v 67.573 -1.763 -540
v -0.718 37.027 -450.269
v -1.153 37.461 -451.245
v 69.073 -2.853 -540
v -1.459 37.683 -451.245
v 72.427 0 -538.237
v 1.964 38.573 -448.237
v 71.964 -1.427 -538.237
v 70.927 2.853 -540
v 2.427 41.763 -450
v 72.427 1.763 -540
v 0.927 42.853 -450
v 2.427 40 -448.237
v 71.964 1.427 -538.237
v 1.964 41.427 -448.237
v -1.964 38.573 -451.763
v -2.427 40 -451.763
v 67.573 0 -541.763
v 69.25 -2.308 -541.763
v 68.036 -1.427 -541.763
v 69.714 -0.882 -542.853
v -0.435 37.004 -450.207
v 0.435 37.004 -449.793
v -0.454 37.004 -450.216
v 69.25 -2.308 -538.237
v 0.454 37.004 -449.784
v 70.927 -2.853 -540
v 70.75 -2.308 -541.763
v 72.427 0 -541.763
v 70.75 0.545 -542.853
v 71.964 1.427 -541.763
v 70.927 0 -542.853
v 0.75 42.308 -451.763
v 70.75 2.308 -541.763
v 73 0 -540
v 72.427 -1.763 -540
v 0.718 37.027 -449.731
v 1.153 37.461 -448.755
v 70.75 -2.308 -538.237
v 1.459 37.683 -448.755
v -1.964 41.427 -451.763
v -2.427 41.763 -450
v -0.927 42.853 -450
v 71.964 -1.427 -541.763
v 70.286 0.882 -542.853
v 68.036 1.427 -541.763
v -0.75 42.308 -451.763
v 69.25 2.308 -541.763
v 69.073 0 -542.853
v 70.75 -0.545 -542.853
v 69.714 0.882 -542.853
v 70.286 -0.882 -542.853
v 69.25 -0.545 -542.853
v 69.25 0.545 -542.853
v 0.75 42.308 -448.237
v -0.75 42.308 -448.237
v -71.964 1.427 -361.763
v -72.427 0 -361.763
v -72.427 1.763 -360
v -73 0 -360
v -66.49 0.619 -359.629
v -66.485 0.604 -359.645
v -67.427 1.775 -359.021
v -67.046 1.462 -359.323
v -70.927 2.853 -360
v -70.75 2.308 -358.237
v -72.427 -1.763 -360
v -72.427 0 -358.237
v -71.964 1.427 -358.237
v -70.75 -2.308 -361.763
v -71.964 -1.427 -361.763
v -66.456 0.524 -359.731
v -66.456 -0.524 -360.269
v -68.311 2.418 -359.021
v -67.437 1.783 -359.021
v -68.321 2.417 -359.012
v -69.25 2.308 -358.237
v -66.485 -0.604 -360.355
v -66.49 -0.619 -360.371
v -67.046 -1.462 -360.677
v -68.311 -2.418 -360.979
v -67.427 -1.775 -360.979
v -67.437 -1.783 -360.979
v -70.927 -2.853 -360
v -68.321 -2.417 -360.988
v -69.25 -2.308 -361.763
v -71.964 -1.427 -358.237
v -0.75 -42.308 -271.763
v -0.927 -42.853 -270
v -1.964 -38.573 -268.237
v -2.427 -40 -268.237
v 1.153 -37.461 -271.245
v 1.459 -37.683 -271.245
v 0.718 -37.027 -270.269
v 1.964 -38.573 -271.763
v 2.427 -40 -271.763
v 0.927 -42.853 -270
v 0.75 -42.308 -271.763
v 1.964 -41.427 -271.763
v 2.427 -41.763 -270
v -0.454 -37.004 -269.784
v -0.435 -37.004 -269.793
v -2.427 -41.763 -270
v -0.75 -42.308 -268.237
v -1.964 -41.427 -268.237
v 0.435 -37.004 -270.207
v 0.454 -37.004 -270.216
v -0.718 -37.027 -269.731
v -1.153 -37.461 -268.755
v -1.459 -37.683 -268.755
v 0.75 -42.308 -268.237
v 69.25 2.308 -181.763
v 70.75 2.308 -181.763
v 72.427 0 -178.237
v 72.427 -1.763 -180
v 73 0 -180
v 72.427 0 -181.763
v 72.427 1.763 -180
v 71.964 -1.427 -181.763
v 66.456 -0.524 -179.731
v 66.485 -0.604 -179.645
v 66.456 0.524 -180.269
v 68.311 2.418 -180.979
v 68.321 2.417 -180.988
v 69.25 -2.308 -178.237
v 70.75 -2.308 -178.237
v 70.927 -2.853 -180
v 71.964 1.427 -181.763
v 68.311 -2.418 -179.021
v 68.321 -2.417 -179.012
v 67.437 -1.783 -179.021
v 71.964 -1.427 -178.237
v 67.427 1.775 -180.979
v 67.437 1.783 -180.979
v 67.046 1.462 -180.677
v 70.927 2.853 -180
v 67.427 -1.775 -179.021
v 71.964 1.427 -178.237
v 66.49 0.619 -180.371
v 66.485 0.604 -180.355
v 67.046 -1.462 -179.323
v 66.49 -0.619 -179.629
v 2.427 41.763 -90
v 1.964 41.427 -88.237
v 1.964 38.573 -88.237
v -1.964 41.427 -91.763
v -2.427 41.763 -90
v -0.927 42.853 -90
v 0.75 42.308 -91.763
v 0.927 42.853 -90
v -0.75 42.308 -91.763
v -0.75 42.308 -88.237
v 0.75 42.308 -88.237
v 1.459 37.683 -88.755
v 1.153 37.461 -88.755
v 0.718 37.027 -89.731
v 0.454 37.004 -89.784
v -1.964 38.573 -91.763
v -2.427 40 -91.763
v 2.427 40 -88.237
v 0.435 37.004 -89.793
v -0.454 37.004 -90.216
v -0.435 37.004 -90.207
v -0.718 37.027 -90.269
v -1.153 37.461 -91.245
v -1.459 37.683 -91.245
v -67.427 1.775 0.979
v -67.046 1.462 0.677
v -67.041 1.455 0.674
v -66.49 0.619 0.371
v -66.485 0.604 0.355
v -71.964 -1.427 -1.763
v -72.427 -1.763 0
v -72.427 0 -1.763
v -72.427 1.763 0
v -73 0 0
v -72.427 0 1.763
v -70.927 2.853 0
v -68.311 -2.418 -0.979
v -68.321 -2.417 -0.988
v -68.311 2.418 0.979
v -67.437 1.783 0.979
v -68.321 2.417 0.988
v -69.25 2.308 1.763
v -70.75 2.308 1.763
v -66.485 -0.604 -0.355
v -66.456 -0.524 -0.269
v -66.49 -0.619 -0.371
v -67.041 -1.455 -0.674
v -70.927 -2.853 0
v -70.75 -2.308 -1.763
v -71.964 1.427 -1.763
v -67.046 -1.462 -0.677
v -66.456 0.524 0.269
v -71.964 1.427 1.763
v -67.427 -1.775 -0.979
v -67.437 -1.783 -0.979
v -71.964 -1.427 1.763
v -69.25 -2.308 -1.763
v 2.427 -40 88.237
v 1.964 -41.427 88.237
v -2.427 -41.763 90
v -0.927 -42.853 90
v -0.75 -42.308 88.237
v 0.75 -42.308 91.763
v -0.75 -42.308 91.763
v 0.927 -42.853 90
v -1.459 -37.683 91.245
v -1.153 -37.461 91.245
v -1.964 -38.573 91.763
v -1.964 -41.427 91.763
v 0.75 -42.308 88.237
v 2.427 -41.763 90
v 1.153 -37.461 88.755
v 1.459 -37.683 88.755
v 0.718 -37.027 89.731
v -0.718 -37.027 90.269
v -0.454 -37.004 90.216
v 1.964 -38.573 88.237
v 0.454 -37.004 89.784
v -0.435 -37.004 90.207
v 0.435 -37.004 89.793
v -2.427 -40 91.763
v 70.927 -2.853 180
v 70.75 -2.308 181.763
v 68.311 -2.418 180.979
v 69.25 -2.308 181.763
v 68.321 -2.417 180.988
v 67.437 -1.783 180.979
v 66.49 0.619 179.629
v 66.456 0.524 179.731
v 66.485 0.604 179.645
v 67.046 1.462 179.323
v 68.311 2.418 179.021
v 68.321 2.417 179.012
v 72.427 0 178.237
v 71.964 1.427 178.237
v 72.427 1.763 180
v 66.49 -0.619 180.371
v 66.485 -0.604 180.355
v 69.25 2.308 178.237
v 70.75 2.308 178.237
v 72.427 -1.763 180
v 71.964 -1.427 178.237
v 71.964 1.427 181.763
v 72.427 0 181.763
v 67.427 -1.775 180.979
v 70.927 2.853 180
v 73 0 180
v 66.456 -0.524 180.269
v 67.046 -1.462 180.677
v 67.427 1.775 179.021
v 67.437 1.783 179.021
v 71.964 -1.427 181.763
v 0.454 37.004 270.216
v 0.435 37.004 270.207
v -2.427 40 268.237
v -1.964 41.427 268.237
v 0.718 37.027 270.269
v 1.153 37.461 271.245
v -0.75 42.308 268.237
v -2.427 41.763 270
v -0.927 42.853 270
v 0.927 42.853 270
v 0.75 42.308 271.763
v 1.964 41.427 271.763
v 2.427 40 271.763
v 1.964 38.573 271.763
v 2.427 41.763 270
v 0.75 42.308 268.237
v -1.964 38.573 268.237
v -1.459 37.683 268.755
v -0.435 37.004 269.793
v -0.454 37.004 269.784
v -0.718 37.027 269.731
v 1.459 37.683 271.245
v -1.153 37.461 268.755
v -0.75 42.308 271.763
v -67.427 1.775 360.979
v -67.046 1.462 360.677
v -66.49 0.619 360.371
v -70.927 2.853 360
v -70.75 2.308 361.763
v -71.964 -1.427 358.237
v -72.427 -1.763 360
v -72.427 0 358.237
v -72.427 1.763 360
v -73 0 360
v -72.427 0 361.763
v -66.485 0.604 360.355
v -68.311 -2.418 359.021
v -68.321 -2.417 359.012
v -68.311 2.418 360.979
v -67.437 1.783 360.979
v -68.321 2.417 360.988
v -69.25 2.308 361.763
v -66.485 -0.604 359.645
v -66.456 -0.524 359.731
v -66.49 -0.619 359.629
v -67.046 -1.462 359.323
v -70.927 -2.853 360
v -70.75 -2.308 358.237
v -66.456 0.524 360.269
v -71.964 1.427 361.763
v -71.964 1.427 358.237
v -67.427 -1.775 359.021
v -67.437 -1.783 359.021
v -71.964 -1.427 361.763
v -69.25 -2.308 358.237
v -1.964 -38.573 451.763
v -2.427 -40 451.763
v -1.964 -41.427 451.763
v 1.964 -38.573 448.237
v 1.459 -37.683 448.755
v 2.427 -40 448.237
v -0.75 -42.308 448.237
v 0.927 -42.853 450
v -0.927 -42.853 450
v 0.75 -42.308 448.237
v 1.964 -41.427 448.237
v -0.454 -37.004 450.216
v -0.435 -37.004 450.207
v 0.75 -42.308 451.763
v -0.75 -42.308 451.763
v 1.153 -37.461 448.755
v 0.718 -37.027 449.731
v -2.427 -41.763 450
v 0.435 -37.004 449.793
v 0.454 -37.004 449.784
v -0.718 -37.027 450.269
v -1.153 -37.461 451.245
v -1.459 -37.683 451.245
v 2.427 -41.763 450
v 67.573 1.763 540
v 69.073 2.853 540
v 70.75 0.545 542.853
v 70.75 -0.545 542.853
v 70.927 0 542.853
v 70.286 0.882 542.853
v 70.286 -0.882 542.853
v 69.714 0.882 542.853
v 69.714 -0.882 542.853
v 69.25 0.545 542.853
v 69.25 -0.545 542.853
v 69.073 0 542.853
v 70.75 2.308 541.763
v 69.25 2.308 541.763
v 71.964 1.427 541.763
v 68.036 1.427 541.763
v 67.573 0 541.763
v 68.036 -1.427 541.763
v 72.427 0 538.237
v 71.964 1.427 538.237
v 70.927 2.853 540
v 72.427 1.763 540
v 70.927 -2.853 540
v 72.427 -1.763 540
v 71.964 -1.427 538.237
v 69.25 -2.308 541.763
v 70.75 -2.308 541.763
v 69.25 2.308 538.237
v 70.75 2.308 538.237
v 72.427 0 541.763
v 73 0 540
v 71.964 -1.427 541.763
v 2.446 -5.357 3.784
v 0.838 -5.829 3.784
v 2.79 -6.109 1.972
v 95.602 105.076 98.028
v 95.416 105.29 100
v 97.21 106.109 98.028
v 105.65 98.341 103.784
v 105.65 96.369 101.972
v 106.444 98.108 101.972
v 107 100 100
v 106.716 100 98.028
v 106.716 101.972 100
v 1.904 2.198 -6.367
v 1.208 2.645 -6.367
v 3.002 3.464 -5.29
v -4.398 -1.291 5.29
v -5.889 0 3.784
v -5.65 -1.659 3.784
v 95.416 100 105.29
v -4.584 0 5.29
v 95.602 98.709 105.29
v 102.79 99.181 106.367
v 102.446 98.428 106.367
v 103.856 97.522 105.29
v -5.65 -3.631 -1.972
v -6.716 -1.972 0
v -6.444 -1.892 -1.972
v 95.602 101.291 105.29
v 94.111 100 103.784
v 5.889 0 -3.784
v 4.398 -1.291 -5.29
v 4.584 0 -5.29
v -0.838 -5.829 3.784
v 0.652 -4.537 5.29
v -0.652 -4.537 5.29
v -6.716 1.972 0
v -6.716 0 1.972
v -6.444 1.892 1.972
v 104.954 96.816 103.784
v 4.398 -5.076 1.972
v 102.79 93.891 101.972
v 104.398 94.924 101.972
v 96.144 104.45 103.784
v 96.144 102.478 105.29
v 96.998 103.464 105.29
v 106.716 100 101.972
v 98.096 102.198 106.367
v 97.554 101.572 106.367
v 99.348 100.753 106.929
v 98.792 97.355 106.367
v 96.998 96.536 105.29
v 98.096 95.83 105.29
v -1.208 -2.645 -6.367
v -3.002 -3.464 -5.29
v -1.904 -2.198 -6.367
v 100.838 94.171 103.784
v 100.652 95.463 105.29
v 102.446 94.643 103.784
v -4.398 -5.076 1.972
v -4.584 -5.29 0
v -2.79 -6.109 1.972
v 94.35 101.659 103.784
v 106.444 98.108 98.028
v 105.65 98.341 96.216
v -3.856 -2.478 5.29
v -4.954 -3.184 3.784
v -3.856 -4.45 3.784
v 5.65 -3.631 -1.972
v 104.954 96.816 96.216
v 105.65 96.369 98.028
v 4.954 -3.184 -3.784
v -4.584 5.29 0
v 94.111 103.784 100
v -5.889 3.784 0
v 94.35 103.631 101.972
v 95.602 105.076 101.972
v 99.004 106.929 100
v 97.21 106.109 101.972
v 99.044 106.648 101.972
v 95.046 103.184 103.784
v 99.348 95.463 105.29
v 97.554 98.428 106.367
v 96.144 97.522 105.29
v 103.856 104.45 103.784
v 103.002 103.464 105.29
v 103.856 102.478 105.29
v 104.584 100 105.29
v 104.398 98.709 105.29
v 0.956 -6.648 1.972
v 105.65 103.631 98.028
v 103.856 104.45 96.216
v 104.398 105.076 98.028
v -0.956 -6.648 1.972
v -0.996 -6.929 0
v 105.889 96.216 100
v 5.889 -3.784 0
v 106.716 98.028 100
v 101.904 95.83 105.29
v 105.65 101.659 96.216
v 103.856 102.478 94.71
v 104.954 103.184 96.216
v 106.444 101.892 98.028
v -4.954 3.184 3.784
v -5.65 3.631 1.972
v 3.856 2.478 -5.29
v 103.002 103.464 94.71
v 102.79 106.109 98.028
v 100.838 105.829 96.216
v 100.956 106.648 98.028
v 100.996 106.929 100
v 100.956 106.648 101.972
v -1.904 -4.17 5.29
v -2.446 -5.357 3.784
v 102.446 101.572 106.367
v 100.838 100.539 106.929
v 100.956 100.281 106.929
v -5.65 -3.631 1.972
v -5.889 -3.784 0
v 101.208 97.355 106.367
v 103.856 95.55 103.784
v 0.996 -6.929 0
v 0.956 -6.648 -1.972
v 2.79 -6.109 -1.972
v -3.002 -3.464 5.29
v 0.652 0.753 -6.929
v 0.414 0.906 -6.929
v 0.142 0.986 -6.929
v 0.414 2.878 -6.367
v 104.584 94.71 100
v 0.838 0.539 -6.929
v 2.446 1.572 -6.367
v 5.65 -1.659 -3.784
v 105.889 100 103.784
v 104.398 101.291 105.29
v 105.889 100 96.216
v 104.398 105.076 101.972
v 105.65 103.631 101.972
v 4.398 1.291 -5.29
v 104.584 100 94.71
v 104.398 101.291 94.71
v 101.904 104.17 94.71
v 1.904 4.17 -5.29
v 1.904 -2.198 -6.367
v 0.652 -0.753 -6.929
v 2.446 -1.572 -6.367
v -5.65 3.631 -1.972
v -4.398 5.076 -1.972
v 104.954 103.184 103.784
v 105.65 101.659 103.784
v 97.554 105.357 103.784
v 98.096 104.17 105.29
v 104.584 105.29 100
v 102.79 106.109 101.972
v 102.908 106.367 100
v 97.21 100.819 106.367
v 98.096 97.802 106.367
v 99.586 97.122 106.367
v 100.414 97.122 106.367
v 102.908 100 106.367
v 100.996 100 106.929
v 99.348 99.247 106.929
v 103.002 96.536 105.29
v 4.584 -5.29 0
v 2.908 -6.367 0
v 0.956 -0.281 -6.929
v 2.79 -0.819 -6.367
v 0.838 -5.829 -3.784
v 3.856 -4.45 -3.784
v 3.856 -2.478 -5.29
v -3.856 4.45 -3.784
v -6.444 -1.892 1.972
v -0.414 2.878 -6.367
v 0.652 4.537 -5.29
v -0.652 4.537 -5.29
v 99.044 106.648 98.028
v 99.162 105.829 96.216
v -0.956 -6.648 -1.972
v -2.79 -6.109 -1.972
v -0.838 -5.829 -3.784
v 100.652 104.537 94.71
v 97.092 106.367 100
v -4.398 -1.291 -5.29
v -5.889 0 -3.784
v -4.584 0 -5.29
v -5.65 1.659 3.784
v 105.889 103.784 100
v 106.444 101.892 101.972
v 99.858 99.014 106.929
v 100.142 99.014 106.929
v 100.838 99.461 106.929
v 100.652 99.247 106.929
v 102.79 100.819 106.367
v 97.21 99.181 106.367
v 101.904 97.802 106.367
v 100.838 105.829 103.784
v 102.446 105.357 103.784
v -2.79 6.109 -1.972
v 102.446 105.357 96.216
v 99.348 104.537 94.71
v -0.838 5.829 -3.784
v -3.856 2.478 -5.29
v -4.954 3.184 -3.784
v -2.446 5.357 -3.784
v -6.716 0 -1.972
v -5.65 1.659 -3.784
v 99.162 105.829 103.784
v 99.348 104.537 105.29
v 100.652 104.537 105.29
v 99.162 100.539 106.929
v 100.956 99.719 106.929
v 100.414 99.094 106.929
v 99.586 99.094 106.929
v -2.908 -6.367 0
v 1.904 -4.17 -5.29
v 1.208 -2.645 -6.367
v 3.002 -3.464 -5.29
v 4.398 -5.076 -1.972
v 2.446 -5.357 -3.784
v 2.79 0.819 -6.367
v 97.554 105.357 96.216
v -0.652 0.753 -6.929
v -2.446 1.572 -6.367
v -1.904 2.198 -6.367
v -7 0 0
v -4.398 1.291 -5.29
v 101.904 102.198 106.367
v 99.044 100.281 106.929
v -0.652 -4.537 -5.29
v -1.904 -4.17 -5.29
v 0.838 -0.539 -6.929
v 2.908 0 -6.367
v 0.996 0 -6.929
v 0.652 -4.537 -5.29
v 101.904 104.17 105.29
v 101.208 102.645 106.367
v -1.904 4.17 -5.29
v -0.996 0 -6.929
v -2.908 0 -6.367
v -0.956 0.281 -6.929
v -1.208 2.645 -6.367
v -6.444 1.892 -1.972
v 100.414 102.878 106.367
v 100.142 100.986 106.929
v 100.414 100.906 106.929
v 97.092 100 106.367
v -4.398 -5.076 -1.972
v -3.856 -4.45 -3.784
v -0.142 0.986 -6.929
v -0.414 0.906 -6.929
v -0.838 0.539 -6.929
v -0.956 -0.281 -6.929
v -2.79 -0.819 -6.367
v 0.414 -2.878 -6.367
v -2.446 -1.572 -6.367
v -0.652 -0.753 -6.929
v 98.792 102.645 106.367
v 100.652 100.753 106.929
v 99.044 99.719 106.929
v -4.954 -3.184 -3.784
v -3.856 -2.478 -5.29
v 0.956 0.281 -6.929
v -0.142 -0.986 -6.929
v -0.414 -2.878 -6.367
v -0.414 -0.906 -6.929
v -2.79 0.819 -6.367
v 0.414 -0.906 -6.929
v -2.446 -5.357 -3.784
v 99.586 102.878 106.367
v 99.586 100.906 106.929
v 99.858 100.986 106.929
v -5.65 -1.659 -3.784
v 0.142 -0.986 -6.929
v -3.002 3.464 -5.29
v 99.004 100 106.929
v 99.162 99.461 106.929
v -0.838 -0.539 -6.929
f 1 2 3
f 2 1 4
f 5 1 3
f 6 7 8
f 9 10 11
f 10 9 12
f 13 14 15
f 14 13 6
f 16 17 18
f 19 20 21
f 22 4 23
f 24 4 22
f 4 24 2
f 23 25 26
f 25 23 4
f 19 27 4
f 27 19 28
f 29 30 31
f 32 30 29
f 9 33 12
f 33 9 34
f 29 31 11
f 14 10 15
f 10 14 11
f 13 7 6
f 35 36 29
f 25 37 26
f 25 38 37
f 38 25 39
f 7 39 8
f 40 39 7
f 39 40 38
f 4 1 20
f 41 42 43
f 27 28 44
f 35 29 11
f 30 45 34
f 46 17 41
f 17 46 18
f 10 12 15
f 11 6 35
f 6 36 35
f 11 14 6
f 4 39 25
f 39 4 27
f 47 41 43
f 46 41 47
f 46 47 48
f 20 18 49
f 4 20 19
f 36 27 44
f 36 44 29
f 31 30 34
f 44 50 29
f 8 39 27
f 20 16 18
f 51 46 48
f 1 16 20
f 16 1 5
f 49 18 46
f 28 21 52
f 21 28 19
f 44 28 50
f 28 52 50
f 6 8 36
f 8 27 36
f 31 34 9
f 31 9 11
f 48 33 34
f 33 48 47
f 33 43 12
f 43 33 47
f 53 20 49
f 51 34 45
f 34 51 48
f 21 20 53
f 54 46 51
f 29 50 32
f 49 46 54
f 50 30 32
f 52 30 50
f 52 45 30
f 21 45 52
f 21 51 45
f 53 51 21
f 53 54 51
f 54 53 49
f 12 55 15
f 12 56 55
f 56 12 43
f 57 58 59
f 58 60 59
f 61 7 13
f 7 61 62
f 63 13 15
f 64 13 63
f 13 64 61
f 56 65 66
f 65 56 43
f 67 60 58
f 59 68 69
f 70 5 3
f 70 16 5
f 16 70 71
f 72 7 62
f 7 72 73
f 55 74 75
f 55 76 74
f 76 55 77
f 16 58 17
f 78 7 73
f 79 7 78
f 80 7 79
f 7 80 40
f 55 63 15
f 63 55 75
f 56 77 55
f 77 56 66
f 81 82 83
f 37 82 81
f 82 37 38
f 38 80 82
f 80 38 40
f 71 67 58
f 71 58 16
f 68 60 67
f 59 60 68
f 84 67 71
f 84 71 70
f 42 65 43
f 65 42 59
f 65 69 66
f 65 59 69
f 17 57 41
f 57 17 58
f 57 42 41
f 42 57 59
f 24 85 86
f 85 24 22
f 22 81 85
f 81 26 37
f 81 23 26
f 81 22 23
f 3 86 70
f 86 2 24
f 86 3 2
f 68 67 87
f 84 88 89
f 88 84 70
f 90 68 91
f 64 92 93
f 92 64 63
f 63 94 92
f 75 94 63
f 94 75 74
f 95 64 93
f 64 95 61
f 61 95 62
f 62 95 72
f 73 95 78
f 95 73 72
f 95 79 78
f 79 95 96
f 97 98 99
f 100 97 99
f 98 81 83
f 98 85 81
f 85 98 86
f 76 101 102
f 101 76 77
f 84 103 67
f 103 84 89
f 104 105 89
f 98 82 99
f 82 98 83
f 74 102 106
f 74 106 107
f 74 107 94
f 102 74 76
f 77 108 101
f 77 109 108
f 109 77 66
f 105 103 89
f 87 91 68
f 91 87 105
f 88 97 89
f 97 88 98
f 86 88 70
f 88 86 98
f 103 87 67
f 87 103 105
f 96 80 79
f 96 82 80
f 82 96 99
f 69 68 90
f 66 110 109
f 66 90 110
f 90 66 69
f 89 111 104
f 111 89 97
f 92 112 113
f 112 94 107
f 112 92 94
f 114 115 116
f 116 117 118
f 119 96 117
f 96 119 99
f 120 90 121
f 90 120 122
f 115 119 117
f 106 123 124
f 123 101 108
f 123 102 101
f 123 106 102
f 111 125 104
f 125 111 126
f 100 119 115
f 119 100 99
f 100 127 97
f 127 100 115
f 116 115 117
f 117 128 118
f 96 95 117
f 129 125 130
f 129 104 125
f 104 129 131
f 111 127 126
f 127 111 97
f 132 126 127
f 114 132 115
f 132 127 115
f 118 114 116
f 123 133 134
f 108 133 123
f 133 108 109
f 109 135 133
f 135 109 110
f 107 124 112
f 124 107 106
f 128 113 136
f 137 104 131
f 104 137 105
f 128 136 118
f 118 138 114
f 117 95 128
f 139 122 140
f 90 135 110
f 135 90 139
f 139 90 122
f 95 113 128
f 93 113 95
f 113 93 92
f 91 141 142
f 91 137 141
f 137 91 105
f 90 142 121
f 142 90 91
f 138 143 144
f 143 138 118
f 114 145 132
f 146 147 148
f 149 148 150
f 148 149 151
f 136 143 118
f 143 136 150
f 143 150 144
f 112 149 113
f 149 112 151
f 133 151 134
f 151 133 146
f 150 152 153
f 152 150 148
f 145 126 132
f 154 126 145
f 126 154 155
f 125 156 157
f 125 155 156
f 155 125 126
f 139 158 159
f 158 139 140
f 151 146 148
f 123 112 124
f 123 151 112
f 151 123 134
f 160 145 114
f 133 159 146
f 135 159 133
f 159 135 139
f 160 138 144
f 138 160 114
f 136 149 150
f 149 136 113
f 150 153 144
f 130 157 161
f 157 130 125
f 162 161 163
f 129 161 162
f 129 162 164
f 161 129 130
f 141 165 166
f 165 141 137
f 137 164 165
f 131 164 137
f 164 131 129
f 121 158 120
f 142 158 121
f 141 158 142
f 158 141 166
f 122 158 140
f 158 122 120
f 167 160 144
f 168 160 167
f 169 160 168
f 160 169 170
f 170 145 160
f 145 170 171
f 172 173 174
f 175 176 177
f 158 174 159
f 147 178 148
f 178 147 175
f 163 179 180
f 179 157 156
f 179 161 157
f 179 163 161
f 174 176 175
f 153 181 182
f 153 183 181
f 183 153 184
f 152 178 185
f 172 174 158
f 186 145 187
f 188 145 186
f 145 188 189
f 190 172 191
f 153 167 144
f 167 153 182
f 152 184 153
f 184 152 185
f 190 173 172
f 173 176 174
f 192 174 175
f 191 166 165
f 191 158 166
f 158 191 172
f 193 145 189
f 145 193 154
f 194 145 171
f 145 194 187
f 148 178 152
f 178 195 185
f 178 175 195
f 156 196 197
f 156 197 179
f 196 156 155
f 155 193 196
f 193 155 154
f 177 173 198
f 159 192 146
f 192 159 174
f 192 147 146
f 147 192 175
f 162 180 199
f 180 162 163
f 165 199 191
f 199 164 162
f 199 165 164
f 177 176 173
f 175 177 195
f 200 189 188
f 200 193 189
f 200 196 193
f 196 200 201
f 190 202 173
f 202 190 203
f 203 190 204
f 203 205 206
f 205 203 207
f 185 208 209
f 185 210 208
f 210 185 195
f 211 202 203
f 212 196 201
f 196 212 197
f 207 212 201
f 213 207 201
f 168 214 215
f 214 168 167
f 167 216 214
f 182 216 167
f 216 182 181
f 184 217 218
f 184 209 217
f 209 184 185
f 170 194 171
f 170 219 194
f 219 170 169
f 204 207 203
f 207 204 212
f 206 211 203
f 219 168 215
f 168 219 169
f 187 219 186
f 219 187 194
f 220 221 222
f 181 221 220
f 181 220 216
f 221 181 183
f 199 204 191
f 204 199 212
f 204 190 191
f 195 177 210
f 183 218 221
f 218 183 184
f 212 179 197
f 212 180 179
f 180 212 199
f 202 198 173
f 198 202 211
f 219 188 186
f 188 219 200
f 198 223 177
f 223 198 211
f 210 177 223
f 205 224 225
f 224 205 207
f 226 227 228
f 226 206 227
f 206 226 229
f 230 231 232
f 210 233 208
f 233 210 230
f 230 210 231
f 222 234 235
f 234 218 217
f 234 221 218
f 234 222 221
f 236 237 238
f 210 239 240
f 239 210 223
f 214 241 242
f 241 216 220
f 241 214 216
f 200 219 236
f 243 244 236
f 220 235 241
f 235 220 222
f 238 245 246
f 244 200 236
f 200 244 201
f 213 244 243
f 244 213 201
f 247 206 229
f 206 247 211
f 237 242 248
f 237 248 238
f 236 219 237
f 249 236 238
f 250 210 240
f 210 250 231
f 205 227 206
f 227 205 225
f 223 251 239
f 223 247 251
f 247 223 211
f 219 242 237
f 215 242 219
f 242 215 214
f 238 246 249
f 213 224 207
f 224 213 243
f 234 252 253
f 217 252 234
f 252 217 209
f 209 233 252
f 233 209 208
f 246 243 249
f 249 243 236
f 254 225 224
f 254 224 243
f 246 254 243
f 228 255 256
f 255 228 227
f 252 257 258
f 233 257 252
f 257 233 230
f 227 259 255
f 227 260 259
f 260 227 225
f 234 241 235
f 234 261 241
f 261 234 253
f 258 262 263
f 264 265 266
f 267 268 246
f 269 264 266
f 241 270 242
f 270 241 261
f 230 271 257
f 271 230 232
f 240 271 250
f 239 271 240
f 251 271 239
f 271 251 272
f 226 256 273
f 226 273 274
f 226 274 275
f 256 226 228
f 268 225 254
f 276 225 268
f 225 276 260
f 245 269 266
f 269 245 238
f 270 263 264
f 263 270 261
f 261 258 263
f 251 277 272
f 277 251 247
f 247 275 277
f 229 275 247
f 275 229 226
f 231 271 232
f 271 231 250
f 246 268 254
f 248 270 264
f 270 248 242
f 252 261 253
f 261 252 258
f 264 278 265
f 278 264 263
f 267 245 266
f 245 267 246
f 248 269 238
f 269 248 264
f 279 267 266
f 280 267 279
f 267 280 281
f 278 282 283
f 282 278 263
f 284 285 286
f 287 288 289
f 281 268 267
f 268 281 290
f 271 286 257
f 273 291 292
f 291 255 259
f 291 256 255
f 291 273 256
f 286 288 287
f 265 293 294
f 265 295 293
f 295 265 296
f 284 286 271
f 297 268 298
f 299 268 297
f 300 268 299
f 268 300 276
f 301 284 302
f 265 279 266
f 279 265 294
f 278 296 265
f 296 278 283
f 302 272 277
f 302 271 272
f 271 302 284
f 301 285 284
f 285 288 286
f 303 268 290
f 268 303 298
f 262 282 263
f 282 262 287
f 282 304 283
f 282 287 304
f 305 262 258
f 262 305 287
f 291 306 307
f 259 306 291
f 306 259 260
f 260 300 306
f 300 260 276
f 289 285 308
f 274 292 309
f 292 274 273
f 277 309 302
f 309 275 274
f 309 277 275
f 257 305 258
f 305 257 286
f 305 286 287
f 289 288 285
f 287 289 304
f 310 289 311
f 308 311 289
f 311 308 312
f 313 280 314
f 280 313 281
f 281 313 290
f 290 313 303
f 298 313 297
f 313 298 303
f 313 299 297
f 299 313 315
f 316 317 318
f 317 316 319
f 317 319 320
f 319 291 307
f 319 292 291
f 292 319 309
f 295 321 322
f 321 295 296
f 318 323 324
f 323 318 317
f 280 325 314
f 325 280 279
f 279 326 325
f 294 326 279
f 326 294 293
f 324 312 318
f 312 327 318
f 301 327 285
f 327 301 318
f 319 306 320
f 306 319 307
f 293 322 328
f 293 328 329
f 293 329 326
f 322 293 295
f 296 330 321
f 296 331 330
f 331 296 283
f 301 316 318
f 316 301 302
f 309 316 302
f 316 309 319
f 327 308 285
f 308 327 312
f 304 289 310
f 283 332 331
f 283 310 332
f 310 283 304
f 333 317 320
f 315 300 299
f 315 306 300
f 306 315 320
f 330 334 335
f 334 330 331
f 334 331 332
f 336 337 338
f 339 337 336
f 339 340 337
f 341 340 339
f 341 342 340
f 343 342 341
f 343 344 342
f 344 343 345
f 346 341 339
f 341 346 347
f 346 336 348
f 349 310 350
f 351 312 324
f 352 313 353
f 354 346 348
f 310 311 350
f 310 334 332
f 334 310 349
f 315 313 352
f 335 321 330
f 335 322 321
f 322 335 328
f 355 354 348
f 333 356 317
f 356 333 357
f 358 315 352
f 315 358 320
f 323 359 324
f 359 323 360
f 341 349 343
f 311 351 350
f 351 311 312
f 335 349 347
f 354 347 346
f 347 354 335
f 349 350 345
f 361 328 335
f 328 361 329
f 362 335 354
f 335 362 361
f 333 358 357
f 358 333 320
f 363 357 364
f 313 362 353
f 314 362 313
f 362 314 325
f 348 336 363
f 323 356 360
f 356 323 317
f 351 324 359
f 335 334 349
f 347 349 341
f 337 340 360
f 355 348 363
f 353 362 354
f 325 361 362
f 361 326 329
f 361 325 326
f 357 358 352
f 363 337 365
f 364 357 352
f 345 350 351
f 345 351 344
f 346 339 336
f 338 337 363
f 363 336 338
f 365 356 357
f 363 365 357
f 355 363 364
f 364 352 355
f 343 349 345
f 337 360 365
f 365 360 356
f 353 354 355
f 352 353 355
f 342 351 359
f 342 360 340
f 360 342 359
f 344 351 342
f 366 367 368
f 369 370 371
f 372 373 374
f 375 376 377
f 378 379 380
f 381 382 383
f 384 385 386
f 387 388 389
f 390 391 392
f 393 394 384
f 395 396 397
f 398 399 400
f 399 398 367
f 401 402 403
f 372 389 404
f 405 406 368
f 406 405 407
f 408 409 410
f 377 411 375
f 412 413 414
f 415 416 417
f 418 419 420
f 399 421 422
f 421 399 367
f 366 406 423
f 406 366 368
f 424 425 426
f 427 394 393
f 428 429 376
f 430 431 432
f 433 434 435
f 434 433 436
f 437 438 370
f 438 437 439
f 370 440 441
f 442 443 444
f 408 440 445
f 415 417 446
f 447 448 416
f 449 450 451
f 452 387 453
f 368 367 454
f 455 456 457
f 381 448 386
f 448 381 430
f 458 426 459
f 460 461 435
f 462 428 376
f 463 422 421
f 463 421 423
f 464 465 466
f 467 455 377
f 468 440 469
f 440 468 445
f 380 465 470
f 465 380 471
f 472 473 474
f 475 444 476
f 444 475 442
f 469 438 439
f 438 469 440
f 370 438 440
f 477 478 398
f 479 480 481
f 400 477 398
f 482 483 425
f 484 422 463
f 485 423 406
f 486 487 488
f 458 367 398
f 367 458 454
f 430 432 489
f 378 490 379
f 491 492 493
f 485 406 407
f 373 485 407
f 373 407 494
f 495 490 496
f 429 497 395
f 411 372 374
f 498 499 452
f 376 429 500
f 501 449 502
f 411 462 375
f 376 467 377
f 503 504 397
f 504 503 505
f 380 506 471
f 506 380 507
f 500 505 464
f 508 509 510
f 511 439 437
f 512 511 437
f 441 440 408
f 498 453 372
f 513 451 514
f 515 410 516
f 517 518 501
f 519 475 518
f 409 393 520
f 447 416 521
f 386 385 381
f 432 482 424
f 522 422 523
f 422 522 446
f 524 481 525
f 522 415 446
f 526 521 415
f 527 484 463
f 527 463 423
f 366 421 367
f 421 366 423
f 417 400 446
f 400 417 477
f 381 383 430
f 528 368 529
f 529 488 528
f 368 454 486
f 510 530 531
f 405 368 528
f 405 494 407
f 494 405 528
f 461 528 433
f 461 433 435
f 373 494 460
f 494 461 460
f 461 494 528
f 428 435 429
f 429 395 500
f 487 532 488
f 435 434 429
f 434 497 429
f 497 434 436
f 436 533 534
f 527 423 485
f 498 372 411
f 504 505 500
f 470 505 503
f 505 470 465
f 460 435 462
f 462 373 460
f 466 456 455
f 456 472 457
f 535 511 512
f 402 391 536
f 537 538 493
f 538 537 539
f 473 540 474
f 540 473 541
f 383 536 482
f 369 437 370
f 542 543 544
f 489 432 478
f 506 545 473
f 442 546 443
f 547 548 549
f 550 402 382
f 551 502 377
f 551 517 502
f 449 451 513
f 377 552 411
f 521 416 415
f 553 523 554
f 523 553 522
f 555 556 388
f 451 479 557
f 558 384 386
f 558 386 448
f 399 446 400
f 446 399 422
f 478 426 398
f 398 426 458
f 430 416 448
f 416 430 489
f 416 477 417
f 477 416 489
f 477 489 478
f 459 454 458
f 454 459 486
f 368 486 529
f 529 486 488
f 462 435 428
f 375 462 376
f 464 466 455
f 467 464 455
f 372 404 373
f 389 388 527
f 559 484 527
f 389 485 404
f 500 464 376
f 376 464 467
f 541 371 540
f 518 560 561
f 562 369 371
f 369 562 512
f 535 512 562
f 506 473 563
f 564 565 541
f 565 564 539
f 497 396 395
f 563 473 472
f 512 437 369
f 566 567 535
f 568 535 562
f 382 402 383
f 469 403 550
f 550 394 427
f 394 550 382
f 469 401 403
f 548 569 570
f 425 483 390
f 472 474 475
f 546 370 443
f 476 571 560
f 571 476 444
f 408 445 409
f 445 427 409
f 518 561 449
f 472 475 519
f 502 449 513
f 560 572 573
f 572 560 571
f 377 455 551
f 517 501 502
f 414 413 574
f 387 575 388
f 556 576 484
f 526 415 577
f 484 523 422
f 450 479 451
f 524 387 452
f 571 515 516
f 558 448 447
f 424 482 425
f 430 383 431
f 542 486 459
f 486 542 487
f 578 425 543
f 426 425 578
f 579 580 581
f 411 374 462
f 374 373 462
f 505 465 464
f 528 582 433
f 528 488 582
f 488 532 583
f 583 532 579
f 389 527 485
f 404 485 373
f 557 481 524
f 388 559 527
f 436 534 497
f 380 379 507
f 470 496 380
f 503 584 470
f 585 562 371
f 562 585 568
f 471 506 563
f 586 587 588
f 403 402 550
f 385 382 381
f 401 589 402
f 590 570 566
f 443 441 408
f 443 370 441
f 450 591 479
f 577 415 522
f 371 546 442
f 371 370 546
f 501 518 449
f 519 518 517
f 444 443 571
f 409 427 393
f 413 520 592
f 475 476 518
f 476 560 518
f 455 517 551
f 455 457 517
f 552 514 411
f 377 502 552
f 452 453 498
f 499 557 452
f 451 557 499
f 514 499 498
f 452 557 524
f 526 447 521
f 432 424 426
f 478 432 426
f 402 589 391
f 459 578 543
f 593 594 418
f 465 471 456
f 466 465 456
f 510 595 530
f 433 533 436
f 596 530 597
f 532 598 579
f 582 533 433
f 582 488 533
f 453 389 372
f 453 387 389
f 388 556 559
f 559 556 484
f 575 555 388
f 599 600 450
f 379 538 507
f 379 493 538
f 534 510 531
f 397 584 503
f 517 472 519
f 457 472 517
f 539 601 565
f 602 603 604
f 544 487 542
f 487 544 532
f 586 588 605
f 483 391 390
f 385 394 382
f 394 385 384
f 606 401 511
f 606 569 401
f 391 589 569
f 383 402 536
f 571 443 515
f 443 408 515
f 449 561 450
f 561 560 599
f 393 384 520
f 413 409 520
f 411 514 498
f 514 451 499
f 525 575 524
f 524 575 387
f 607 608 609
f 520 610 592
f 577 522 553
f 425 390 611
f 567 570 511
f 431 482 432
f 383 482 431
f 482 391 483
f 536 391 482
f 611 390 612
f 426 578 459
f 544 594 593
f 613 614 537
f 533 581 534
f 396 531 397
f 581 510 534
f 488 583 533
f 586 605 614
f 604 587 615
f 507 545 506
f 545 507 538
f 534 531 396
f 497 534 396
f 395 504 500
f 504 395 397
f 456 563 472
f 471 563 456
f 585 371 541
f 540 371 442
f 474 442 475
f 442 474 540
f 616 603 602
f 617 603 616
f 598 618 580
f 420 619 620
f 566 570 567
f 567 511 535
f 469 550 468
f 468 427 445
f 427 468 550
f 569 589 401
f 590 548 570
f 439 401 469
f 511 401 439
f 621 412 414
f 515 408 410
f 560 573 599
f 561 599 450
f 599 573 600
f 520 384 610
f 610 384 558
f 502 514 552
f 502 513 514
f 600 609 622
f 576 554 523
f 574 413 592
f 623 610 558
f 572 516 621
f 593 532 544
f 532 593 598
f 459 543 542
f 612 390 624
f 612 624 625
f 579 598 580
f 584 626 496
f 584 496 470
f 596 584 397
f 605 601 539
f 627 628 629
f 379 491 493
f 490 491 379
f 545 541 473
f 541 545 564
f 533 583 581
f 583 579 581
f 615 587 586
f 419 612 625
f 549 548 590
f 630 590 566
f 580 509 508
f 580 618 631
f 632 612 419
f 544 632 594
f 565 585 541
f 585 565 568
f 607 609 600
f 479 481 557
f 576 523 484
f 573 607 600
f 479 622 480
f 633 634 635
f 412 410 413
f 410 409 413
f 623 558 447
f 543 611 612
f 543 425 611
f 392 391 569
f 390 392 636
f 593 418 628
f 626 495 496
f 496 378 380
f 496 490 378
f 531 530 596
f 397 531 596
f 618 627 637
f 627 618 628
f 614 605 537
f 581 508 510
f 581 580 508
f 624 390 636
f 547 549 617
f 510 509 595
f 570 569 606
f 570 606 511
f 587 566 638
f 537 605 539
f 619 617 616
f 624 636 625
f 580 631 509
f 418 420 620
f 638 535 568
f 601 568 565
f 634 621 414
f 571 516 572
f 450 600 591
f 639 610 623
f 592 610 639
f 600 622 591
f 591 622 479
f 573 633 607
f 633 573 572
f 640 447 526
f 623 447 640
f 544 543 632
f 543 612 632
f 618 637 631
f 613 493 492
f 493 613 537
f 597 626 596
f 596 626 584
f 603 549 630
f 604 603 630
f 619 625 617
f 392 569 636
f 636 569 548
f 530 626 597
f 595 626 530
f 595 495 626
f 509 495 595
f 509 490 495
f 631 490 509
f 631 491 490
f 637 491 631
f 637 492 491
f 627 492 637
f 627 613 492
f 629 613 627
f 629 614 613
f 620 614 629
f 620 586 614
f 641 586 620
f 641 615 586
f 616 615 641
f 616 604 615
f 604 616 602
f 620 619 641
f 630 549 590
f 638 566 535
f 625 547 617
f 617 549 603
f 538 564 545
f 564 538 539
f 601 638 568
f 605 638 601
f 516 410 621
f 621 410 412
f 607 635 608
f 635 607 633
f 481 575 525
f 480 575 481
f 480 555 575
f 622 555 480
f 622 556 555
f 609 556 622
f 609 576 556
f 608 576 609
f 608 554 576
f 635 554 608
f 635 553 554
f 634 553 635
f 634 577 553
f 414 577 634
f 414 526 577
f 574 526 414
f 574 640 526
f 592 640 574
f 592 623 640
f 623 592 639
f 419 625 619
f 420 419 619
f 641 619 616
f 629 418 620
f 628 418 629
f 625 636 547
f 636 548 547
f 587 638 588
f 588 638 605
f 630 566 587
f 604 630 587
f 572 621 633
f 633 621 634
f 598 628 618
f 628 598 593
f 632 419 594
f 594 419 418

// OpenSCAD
// Draws a rod between two points with a given thickness (by default 0.1)
// The rod has two spherical endcaps which are centered around the endpoints
// Therefore it is actually a bit wider
module rod(from, to, thickness = 0.1) {
    hull() {
            translate(from) sphere(thickness);
            translate(to) sphere(thickness);
    }
}

// Draws multiple rods between the list of coordinates with a given thickness
module rods(coords, thickness = 0.1) {
    for (i = [0:len(coords)-2]) {
        rod(coords[i], coords[i+1], thickness);
    }
}

// Draws a label with 'l' with a given size and color such that it always
// faces the direction of the viewport
module label(l, size = 1, c="black") {
    color(c) rotate($vpr) text(str(l), size);
}

rod([0, 0, 0], [100, 100, 100], 7);

rods([for (i = [0:90:360*3]) [cos(i) * 70, sin(i) * 40, i-360*1.5]], 3);

translate([100, 100, 100]) label("This is an auto adjusting label!", 50);
    
